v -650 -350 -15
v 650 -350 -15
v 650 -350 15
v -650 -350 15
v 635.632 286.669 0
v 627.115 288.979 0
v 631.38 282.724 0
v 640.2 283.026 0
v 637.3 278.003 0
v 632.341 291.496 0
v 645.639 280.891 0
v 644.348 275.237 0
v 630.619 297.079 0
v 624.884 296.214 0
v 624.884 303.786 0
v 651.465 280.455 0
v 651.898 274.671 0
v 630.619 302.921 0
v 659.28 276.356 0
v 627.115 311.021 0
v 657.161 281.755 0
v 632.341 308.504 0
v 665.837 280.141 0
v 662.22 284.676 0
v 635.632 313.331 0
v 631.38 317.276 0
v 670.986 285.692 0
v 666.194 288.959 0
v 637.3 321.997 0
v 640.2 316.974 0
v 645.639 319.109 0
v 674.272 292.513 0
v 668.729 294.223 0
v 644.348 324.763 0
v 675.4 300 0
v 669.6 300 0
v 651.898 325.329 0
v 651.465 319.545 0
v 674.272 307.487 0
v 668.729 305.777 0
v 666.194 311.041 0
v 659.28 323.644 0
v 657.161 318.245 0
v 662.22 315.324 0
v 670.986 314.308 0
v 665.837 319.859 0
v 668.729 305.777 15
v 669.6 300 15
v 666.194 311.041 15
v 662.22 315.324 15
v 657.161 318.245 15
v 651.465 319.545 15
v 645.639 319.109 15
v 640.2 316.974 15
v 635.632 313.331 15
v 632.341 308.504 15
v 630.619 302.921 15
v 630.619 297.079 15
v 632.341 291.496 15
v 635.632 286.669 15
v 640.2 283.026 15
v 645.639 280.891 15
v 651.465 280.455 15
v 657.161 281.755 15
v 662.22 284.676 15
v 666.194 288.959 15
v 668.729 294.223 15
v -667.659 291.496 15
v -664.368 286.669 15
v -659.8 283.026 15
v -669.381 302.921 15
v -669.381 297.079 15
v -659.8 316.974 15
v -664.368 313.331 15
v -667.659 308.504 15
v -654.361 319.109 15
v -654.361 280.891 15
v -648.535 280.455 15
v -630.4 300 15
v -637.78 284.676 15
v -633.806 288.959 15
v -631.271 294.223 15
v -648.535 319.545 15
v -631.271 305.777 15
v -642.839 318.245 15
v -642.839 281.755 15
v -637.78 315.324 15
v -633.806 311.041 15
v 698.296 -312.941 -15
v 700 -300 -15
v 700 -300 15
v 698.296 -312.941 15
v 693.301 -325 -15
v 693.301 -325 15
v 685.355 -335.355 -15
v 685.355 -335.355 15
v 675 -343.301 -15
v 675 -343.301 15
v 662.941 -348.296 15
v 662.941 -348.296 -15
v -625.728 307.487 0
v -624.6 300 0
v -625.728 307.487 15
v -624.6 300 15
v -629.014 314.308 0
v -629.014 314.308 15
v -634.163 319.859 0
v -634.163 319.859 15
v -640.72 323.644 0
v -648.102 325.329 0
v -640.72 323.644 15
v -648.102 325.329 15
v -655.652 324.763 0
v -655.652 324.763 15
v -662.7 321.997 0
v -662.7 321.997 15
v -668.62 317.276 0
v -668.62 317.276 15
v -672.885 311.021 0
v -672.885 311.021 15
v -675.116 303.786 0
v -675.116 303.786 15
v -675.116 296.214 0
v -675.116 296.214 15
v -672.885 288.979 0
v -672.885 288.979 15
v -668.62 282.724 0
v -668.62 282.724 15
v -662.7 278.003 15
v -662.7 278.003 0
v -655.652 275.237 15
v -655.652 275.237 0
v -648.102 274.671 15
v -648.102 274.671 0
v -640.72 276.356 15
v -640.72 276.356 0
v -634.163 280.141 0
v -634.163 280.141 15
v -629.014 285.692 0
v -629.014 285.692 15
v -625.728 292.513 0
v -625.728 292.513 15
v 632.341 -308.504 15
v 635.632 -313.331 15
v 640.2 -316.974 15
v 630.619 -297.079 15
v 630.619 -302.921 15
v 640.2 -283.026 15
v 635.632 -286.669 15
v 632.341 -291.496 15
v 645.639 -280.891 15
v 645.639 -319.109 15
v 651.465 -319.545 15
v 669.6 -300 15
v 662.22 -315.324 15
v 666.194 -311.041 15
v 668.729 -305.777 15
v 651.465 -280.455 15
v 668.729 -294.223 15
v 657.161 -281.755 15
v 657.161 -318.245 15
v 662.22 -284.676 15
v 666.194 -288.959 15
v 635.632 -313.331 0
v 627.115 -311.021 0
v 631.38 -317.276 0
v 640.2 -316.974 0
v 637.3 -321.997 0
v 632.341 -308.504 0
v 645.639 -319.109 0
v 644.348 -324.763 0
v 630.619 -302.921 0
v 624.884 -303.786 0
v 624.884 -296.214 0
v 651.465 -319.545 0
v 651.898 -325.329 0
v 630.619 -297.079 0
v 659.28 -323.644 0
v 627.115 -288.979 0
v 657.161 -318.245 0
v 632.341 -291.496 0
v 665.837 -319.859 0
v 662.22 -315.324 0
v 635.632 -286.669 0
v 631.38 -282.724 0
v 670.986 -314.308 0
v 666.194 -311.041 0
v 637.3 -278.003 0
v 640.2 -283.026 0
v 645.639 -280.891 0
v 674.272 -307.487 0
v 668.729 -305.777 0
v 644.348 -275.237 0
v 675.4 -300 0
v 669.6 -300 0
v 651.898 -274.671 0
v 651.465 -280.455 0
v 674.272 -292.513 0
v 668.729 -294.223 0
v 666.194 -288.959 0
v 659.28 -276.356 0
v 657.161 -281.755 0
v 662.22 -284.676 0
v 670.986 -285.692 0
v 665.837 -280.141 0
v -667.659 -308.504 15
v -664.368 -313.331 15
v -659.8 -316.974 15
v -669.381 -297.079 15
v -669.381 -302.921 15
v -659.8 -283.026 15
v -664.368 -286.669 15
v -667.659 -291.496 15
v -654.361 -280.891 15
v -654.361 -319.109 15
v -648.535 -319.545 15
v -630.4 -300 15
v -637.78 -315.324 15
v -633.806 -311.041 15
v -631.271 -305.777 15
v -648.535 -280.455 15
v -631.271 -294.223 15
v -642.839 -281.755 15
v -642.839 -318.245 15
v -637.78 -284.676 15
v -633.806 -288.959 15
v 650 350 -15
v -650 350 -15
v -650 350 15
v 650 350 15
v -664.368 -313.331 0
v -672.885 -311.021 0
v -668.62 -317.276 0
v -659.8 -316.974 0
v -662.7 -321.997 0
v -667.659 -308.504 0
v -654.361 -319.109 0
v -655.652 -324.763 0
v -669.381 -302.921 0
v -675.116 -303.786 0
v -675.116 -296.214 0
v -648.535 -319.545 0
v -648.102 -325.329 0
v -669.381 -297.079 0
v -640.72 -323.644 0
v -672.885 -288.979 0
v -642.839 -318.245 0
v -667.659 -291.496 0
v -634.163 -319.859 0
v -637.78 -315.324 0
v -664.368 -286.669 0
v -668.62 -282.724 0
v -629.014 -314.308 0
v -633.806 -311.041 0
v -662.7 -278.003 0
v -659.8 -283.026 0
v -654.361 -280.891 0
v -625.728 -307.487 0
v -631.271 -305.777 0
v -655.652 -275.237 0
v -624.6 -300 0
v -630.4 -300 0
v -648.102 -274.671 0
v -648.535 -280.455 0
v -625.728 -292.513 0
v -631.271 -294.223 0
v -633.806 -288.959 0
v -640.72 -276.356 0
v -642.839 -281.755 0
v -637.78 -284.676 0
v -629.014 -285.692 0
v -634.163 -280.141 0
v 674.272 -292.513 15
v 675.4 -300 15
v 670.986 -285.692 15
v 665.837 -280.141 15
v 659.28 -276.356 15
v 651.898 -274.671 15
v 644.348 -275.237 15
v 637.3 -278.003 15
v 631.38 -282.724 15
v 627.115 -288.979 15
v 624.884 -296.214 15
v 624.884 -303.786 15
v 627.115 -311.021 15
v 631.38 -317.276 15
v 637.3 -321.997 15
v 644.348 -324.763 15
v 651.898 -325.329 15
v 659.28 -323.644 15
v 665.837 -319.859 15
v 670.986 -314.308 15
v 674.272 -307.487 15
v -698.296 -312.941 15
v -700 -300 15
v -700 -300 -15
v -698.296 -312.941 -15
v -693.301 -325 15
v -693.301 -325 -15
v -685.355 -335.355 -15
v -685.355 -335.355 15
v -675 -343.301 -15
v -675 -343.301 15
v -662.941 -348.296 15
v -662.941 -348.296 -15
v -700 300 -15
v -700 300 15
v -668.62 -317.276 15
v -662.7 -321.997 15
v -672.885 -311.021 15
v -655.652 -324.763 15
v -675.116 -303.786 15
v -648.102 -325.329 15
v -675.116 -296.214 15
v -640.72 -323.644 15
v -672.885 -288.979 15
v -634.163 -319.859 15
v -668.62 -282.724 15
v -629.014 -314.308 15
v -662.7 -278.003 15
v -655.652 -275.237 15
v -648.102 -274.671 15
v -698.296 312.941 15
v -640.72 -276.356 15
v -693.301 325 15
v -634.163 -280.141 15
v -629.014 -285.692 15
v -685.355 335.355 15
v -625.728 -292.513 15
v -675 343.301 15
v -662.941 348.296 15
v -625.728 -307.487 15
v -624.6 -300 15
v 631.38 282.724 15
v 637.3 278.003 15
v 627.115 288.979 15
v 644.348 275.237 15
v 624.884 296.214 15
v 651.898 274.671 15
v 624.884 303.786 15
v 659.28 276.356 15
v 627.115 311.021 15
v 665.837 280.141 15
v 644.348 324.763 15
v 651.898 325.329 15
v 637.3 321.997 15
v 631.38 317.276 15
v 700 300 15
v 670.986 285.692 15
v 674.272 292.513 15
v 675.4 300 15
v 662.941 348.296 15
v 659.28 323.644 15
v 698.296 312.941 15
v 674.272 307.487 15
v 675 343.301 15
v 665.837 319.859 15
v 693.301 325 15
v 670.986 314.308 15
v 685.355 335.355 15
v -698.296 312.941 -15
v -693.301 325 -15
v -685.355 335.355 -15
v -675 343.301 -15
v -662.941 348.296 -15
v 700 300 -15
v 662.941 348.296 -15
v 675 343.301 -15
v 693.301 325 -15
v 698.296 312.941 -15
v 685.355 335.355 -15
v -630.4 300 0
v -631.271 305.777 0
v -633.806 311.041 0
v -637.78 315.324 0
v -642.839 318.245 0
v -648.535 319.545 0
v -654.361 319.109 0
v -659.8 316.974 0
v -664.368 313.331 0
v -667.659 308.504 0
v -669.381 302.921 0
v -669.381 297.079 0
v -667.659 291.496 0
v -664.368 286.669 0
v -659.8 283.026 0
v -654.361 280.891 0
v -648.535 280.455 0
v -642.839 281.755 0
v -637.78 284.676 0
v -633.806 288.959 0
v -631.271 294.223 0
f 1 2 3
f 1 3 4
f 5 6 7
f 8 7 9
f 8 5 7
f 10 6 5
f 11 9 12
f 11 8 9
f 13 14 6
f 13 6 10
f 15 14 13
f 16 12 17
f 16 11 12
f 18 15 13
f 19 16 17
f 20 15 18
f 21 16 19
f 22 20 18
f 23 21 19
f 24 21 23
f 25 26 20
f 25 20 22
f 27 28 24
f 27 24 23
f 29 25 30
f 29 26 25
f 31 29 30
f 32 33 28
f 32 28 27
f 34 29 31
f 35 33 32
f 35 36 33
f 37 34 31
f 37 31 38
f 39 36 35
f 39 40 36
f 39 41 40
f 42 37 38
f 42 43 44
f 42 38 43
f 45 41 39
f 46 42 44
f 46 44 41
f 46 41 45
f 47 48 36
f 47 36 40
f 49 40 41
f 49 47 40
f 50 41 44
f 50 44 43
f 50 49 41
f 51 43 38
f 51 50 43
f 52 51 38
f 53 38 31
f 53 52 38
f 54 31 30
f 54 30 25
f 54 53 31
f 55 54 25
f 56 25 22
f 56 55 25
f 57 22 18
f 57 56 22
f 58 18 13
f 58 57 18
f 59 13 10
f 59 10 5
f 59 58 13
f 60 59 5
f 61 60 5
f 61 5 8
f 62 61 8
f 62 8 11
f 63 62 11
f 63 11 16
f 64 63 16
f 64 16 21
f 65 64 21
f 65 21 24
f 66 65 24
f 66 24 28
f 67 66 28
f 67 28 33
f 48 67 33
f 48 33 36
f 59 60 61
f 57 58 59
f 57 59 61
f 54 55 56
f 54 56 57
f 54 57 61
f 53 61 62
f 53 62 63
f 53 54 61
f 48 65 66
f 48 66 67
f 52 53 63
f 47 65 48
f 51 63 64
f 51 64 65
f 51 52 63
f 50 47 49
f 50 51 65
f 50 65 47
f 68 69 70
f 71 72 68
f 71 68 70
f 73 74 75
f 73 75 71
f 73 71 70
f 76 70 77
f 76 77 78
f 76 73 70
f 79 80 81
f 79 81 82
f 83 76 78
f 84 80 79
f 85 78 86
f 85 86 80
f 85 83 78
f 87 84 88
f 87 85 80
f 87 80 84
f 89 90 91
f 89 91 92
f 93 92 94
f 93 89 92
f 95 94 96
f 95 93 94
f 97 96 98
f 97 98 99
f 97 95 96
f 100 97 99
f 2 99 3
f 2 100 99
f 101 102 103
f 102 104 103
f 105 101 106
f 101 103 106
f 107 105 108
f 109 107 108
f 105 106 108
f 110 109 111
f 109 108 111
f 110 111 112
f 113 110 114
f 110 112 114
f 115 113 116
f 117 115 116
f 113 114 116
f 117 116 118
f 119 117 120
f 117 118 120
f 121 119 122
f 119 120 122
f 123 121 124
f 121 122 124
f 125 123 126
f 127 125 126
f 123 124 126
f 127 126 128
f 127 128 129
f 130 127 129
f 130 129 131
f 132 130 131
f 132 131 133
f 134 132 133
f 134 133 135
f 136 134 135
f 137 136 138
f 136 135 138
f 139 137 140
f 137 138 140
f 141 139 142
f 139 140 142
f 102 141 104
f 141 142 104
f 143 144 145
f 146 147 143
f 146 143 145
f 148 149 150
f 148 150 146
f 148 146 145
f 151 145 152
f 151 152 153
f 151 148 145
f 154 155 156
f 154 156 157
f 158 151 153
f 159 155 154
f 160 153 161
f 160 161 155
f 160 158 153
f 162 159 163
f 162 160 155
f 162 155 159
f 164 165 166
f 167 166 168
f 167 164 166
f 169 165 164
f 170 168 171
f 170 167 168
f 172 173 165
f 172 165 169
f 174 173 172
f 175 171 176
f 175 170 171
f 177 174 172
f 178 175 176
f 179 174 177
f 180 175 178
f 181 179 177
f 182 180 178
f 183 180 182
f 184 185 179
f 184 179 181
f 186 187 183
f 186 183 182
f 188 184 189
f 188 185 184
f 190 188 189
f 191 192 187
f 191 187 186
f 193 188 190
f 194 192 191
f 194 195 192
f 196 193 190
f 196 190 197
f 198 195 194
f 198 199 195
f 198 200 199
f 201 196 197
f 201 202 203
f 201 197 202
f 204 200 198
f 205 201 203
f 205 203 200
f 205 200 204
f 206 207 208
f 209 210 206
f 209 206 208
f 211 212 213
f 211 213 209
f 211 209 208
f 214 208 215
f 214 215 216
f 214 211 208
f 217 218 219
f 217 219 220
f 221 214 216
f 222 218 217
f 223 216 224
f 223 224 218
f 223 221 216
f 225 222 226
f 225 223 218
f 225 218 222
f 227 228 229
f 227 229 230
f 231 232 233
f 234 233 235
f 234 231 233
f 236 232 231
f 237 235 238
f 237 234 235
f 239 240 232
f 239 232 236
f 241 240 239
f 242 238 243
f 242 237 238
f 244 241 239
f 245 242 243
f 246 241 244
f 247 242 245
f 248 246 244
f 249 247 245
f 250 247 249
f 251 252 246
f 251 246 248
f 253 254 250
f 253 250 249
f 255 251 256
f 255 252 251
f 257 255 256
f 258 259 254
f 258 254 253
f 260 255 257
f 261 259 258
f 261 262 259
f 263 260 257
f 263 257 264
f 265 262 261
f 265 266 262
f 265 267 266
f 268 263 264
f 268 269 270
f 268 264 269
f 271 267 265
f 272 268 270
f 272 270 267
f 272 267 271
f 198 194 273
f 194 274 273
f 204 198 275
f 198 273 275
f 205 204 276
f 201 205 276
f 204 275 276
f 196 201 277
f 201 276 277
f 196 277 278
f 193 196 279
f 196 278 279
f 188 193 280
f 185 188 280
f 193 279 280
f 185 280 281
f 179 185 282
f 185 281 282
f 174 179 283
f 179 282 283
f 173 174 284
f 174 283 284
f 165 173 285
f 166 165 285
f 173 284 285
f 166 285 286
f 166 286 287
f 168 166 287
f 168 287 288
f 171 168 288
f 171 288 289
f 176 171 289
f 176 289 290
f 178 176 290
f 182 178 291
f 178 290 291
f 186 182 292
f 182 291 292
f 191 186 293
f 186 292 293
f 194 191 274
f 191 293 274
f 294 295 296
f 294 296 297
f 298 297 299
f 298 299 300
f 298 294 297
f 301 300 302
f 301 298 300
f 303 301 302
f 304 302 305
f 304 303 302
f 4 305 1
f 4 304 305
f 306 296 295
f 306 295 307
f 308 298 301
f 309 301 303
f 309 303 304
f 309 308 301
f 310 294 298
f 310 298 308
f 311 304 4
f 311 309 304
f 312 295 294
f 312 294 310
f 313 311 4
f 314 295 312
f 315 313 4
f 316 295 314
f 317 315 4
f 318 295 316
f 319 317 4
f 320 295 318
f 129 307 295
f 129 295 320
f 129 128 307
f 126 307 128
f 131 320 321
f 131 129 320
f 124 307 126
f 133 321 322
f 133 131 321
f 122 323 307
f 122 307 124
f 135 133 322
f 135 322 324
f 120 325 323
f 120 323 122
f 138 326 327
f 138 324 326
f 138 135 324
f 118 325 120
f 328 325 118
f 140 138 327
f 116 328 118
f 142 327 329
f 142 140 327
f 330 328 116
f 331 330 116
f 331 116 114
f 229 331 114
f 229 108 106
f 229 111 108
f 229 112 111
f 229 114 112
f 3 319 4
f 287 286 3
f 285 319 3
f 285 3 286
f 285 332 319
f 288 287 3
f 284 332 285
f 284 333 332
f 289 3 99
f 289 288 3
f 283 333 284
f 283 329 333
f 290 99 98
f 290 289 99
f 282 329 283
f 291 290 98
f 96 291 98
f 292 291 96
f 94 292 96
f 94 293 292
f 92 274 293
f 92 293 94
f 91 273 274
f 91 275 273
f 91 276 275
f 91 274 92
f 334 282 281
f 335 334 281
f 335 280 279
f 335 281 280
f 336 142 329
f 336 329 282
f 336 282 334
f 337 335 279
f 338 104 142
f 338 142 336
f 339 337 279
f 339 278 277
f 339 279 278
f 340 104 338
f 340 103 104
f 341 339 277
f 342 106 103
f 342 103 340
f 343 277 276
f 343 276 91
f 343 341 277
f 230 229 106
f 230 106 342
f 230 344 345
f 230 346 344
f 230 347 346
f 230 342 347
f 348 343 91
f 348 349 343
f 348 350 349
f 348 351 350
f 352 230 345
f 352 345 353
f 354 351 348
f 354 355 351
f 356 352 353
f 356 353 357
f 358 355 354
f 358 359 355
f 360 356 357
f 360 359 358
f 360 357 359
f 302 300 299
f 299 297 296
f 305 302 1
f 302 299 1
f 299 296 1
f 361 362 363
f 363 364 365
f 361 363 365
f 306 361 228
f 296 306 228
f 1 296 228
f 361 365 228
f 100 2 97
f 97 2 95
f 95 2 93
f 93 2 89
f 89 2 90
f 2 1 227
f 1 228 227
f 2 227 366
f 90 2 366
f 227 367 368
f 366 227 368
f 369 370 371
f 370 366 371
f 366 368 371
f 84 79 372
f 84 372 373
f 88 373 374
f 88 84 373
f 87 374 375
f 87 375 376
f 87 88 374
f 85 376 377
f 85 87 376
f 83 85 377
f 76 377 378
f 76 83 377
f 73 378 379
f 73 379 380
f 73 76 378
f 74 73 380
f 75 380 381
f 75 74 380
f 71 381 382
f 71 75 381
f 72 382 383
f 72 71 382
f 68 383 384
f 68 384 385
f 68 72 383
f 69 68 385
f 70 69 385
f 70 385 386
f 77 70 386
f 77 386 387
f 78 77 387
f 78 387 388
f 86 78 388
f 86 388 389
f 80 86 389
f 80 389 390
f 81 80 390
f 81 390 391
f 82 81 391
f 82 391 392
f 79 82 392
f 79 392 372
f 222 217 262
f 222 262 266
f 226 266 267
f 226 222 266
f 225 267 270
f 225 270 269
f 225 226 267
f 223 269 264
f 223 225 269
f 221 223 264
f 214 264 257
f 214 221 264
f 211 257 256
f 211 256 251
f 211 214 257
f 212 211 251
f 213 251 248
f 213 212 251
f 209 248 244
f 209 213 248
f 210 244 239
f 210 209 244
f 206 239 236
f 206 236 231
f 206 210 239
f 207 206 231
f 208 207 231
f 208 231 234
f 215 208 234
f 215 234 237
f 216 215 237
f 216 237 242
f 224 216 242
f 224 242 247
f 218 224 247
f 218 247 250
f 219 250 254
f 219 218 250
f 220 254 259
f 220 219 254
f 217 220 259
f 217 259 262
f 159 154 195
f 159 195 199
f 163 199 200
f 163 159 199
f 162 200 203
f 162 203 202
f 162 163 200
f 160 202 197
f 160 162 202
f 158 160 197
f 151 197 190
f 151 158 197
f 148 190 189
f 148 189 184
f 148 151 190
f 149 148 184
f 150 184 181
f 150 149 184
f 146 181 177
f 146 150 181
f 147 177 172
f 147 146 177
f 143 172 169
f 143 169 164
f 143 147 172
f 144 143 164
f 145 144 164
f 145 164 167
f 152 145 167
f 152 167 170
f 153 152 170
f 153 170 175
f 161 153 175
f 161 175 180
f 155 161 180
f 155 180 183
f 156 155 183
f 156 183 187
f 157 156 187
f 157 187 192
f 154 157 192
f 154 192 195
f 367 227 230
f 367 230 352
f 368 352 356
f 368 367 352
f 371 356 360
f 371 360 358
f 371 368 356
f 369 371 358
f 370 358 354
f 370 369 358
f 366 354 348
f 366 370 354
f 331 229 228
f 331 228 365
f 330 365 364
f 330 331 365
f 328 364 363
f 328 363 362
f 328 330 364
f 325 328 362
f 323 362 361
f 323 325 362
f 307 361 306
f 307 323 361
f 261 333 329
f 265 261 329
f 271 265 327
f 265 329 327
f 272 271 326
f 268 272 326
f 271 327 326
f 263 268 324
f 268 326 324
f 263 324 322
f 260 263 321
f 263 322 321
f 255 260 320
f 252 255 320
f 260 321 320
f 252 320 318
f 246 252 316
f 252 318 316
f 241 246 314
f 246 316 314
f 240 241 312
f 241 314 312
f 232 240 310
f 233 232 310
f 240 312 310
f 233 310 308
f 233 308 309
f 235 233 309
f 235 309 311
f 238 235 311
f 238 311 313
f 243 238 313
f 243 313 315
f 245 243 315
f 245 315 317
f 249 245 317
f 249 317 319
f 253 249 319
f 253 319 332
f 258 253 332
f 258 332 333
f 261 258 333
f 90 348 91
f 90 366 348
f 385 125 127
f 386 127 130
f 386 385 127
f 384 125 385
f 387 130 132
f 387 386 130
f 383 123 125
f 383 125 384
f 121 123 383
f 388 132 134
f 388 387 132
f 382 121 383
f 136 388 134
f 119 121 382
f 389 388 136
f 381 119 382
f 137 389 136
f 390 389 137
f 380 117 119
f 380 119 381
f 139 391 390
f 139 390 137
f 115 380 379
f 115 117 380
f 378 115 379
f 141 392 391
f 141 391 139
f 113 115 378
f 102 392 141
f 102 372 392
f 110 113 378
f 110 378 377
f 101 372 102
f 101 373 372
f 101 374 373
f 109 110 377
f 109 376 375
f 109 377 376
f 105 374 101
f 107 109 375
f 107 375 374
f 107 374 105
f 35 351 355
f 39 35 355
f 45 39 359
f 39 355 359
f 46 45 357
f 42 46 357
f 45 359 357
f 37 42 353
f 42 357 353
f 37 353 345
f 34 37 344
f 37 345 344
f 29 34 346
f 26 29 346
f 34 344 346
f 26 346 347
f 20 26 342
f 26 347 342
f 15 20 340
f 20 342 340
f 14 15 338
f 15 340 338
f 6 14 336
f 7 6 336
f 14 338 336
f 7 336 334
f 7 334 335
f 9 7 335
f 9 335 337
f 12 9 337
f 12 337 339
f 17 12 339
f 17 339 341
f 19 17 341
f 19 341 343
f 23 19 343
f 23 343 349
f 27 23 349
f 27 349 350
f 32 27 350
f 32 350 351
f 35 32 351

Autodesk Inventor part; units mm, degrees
sketch "Sketch1" plane through (0, 0, 0) normal (0, 0, 1) x (1, 0, 0)
  line L0 (-700, 350) -> (700, 350)
  line L1 (700, 350) -> (700, -350)
  line L2 (700, -350) -> (-700, -350)
  line L3 (-700, -350) -> (-700, 350)
  line L4 (-700, 350) -> (700, -350) construction
  line L5 (700, 350) -> (-700, -350) construction
  point P0 (0, 0)
  point P1 (0, 0)
  dimension "d1" = 1400
  dimension "d2" = 700
extrude "Extrusion1" add sketch "Sketch1" along normal mid plane 30
fillet "Fillet1" radius 50 4 edges at (700, 350, 0) (-700, 350, 0) (700, -350, 0) (-700, -350, 0)
sketch "Sketch2" plane through (0, 0, 15) normal (0, 0, 1) x (1, 0, 0)
  circle A0 centre (650, -300) radius 25.4
  line L0 (-737.5381, 0) -> (737.5381, 0) construction
  circle A1 centre (650, 300) radius 25.4
  line L1 (0, -555.4788) -> (0, 555.4788) construction
  circle A2 centre (-650, -300) radius 25.4
  circle A3 centre (-650, 300) radius 25.4
  circle A4 centre (650, -300) radius 19.6
  circle A5 centre (-650, -300) radius 19.6
  circle A6 centre (650, 300) radius 19.6
  circle A7 centre (-650, 300) radius 19.6
  point P0 (0, 0)
  point P1 (0, 0)
  point P2 (0, 0)
  dimension "d6" = 50.8
  dimension "d7" = 650
  dimension "d8" = 300
  dimension "d15" = 5.8
extrude "Extrusion2" cut sketch "Sketch2" against normal blind 15
properties part number "Sessao_02_04_002_001" material "Wood (Cherry)"
